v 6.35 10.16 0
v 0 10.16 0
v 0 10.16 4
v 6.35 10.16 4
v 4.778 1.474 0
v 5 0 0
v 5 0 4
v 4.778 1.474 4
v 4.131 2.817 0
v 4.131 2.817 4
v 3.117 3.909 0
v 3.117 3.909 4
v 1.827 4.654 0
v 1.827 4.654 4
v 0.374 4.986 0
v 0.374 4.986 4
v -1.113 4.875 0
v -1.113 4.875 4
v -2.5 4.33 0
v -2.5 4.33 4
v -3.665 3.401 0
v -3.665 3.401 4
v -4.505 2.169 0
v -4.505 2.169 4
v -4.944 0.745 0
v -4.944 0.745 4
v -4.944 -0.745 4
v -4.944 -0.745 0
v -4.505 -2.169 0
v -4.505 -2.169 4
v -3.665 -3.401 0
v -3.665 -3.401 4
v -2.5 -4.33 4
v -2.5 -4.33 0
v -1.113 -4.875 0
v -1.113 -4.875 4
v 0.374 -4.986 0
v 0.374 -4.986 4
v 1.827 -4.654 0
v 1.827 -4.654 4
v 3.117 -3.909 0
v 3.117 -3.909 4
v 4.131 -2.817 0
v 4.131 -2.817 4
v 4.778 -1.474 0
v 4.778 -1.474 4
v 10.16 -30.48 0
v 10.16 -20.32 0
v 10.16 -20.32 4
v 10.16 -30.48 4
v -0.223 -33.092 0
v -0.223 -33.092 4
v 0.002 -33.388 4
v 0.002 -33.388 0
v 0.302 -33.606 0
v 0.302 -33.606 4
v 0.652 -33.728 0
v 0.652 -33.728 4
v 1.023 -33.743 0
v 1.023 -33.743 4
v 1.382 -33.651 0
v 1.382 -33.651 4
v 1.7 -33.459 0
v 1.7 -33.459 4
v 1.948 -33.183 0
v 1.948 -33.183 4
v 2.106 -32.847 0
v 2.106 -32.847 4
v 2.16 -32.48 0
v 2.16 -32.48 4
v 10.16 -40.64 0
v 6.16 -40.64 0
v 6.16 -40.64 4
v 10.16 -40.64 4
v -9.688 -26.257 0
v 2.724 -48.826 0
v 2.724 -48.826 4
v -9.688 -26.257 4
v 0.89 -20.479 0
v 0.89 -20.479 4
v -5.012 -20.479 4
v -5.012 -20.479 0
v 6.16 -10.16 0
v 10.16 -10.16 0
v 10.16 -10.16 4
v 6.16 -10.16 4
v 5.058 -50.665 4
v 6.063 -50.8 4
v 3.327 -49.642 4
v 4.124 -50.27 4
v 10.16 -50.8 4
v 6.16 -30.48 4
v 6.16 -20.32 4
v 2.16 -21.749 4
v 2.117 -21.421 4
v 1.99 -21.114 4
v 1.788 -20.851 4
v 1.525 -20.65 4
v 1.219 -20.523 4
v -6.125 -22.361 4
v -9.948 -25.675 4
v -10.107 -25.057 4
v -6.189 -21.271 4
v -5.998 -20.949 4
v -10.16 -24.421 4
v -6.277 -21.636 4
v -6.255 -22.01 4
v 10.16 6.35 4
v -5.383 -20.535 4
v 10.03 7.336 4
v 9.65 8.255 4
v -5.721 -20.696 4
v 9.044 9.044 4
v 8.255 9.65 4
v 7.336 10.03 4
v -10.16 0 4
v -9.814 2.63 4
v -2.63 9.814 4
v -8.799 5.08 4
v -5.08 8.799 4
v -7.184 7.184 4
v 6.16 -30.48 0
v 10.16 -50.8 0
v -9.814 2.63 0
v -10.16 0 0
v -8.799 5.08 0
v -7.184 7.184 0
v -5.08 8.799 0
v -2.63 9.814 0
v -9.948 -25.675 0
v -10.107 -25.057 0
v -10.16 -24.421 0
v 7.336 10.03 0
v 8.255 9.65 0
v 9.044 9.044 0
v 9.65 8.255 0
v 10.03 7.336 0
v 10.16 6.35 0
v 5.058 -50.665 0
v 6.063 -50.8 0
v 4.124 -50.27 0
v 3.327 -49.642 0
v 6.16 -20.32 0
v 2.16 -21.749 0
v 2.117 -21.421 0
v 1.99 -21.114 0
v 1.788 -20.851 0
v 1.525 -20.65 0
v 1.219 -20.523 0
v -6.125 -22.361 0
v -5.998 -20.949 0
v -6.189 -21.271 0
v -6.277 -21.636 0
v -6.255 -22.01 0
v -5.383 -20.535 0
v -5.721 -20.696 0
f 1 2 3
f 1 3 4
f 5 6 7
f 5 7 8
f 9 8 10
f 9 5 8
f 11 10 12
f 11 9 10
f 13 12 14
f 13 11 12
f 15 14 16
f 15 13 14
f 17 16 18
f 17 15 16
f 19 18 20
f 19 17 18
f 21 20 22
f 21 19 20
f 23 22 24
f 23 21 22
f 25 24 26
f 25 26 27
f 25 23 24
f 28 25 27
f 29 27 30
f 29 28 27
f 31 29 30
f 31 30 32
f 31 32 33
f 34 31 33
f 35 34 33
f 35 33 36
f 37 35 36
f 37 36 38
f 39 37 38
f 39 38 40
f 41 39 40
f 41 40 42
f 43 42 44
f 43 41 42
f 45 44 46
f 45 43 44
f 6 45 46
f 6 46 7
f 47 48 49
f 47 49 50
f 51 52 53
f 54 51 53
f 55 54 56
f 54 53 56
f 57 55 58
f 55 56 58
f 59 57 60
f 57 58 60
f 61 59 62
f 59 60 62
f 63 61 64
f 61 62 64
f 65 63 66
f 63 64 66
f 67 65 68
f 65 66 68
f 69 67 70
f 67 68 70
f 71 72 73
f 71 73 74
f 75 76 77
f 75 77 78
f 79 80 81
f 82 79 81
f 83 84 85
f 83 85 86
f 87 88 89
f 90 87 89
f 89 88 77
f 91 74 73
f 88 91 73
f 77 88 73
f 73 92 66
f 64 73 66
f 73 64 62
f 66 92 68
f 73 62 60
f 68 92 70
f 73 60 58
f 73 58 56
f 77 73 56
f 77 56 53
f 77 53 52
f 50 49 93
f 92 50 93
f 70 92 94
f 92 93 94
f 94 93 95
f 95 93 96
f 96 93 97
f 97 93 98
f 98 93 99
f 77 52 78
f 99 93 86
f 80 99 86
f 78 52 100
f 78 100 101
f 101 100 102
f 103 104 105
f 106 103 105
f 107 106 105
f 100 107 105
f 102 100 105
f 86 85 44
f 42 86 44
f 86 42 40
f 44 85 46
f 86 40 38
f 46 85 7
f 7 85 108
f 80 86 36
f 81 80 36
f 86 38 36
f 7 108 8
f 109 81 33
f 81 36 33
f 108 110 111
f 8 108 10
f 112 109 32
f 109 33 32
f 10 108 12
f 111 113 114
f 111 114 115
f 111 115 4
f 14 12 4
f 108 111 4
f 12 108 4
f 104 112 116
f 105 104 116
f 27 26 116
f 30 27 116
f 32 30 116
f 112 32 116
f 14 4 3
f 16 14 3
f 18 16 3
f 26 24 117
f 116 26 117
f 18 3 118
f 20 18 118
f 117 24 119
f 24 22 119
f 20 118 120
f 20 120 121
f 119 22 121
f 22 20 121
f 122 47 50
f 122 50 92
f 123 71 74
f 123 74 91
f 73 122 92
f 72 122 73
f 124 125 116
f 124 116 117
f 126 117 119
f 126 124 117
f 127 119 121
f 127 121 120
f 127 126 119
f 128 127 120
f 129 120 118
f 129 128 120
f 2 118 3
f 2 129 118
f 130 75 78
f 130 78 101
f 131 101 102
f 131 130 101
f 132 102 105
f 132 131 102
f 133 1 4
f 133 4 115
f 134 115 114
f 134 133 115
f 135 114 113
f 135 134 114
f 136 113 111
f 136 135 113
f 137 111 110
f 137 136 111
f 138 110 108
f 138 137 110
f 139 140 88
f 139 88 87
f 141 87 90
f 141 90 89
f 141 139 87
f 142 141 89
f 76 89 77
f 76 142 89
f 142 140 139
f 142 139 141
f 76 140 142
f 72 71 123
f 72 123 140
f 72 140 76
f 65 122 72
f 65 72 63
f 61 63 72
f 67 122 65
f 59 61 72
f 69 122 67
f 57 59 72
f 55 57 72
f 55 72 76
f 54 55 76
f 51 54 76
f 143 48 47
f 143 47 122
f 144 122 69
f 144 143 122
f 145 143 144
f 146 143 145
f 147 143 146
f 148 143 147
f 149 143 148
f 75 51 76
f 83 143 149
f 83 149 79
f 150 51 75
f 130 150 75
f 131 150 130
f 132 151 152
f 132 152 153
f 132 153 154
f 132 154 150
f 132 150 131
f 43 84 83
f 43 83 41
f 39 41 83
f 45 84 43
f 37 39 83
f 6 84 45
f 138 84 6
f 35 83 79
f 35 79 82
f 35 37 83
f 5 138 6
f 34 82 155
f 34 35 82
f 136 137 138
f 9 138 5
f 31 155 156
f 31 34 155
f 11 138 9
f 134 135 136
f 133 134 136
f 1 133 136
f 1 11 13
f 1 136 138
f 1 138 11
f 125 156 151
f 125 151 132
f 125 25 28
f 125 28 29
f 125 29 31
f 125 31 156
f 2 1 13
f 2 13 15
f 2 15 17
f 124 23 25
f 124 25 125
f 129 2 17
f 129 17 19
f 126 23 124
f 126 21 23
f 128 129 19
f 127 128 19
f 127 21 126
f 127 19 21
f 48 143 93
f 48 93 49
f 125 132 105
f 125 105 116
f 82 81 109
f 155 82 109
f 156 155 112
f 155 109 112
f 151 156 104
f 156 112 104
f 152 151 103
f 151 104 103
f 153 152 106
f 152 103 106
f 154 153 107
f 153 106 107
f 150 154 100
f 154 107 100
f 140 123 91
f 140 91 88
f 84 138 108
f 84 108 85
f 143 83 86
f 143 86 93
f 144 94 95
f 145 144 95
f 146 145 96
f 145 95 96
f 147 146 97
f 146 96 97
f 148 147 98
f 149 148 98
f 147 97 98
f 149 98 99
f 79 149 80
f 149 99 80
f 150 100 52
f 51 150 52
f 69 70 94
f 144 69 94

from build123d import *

# Parameters (mm, degrees)
SKETCH1_R           = 5
BOSS_EXTRUDE2_DEPTH = 4
CUT_EXTRUDE1_REACH  = 53.96


with BuildPart() as part:
    # Sketch1 → Boss-Extrude2 (new body)
    with BuildSketch(Plane.XY):
        with BuildLine():
            Line((10.16, 6.35), (10.16, -10.16))
            Line((10.16, -10.16), (6.16, -10.16))
            Line((6.16, -10.16), (6.16, -20.32))
            Line((6.16, -20.32), (10.16, -20.32))
            Line((10.16, -20.32), (10.16, -30.48))
            Line((10.16, -30.48), (6.16, -30.48))
            Line((6.16, -30.48), (6.16, -40.64))
            Line((6.16, -40.64), (10.16, -40.64))
            Line((10.16, -40.64), (10.16, -50.8))
            Line((10.16, -50.8), (6.062743352, -50.8))
            ThreePointArc((6.062743352, -50.8), (4.123604466, -50.269609791), (2.72436074, -48.826110437))
            Line((2.72436074, -48.826110437), (-9.688382612, -26.25748616))
            ThreePointArc((-9.688382612, -26.25748616), (-10.040212579, -25.36923179), (-10.16, -24.421375723))
            Line((-10.16, -24.421375723), (-10.16, 0))
            ThreePointArc((-10.16, 0), (-7.184204897, 7.184204897), (0, 10.16))
            Line((0, 10.16), (6.35, 10.16))
            ThreePointArc((6.35, 10.16), (9.044076836, 9.044076836), (10.16, 6.35))
        make_face()
        Circle(SKETCH1_R, mode=Mode.SUBTRACT)
    extrude(amount=BOSS_EXTRUDE2_DEPTH)

    # Sketch2 → Cut-Extrude1 (cut, up to next)
    with BuildSketch(Plane.XY.offset(4), mode=Mode.PRIVATE) as cut_extrude1_sk1:
        with BuildLine():
            Line((-6.124879753, -22.361389348), (-0.222794204, -33.092453983))
            ThreePointArc((-0.222794204, -33.092453983), (1.205952022, -33.71048803), (2.16, -32.480417171))
            Line((2.16, -32.480417171), (2.16, -21.749352536))
            ThreePointArc((2.16, -21.749352536), (1.788025612, -20.851326924), (0.89, -20.479352536))
            Line((0.89, -20.479352536), (-5.012085549, -20.479352536))
            ThreePointArc((-5.012085549, -20.479352536), (-6.105288813, -21.102972907), (-6.124879753, -22.361389348))
        make_face()
    cut_extrude1_tool1 = extrude(cut_extrude1_sk1.sketch, amount=-CUT_EXTRUDE1_REACH, mode=Mode.PRIVATE) & part.part
    add(cut_extrude1_tool1.solids().sort_by_distance((-1.019639, -25.736268, 4))[0], mode=Mode.SUBTRACT)


solid = part.part
